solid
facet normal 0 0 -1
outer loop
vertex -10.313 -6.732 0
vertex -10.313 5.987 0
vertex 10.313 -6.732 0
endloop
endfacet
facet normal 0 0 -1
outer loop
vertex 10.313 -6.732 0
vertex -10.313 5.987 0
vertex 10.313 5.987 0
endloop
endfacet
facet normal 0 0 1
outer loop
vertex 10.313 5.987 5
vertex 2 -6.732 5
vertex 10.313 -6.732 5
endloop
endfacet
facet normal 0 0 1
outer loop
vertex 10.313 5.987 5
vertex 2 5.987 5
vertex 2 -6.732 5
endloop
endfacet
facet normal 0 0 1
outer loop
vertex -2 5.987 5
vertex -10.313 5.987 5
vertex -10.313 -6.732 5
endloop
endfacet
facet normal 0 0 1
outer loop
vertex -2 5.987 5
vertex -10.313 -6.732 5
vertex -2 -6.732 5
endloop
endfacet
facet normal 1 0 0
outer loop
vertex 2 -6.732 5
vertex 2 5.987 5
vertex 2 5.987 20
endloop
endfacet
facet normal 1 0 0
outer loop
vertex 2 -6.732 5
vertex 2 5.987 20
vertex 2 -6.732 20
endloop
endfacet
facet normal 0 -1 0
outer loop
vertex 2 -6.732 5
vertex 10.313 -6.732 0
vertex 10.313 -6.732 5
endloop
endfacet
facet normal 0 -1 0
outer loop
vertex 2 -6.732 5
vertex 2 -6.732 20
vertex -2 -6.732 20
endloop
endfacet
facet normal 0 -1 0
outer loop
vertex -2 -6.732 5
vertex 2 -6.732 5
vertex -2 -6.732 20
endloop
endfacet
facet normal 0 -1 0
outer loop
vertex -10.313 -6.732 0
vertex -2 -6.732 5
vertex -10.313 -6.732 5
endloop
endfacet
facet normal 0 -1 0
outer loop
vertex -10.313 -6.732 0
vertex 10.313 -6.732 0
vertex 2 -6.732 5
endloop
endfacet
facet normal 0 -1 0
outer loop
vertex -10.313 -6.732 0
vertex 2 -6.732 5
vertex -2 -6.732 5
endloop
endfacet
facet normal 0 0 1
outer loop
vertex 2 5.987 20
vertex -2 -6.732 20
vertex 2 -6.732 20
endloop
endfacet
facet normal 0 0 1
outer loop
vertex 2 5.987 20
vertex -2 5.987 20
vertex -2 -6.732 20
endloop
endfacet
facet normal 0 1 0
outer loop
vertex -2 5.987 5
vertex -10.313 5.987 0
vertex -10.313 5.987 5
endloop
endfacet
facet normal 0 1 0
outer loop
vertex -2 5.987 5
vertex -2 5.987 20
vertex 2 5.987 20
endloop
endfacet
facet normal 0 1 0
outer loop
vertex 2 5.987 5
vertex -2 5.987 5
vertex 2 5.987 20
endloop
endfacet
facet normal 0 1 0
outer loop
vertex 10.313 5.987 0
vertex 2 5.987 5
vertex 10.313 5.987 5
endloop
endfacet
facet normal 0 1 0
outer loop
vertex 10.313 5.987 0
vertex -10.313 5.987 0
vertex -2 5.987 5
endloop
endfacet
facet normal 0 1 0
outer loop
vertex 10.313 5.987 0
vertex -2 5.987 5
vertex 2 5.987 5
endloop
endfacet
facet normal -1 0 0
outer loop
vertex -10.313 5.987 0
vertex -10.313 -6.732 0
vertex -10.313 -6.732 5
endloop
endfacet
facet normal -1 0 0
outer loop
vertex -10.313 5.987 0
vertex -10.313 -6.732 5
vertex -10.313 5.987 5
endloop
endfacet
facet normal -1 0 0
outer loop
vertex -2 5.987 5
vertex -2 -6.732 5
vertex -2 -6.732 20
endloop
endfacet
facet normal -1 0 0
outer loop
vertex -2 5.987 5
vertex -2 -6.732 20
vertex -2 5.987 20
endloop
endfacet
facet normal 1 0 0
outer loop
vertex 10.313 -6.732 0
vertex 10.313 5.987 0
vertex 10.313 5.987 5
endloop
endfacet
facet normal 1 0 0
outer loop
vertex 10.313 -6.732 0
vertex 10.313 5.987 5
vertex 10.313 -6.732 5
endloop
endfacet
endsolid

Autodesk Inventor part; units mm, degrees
ref_plane "YZ Plane" through (0, 0, 0) normal (1, 0, 0) x (0, 1, 0)
ref_plane "XZ Plane" through (0, 0, 0) normal (0, 1, 0) x (-1, 0, 0)
ref_plane "XY Plane" through (0, 0, 0) normal (0, 0, 1) x (1, 0, 0)
sketch "Sketch1" plane through (0, 0, 0) normal (0, 0, 1) x (1, 0, 0)
  line L0 (-10.3132, 5.9874) -> (10.3132, 5.9874)
  line L1 (10.3132, 5.9874) -> (10.3132, -6.7322)
  line L2 (10.3132, -6.7322) -> (-10.3132, -6.7322)
  line L3 (-10.3132, -6.7322) -> (-10.3132, 5.9874)
  line L4 (-10.3132, 5.9874) -> (10.3132, -6.7322) construction
  line L5 (10.3132, 5.9874) -> (-10.3132, -6.7322) construction
  point P0 (0, 0)
  point P1 (0, -0.3724)
extrude "Extrusion1" add sketch "Sketch1" along normal blind 5
sketch "Sketch2" plane through (0, 0, 5) normal (0, 0, 1) x (1, 0, 0)
  line L0 (10.3132, 5.9874) -> (-10.3132, 5.9874) projected
  line L1 (-10.3132, -6.7322) -> (10.3132, -6.7322) projected
  line L2 (0, 5.9874) -> (2, 5.9874)
  line L3 (2, 5.9874) -> (2, -6.7322)
  line L4 (2, -6.7322) -> (-2, -6.7322)
  line L5 (-2, -6.7322) -> (-2, 5.9874)
  line L6 (0, 5.9874) -> (-2, 5.9874)
  dimension "d2" = 2
  dimension "d3" = 4
extrude "Extrusion2" add sketch "Sketch2" along normal blind 15
